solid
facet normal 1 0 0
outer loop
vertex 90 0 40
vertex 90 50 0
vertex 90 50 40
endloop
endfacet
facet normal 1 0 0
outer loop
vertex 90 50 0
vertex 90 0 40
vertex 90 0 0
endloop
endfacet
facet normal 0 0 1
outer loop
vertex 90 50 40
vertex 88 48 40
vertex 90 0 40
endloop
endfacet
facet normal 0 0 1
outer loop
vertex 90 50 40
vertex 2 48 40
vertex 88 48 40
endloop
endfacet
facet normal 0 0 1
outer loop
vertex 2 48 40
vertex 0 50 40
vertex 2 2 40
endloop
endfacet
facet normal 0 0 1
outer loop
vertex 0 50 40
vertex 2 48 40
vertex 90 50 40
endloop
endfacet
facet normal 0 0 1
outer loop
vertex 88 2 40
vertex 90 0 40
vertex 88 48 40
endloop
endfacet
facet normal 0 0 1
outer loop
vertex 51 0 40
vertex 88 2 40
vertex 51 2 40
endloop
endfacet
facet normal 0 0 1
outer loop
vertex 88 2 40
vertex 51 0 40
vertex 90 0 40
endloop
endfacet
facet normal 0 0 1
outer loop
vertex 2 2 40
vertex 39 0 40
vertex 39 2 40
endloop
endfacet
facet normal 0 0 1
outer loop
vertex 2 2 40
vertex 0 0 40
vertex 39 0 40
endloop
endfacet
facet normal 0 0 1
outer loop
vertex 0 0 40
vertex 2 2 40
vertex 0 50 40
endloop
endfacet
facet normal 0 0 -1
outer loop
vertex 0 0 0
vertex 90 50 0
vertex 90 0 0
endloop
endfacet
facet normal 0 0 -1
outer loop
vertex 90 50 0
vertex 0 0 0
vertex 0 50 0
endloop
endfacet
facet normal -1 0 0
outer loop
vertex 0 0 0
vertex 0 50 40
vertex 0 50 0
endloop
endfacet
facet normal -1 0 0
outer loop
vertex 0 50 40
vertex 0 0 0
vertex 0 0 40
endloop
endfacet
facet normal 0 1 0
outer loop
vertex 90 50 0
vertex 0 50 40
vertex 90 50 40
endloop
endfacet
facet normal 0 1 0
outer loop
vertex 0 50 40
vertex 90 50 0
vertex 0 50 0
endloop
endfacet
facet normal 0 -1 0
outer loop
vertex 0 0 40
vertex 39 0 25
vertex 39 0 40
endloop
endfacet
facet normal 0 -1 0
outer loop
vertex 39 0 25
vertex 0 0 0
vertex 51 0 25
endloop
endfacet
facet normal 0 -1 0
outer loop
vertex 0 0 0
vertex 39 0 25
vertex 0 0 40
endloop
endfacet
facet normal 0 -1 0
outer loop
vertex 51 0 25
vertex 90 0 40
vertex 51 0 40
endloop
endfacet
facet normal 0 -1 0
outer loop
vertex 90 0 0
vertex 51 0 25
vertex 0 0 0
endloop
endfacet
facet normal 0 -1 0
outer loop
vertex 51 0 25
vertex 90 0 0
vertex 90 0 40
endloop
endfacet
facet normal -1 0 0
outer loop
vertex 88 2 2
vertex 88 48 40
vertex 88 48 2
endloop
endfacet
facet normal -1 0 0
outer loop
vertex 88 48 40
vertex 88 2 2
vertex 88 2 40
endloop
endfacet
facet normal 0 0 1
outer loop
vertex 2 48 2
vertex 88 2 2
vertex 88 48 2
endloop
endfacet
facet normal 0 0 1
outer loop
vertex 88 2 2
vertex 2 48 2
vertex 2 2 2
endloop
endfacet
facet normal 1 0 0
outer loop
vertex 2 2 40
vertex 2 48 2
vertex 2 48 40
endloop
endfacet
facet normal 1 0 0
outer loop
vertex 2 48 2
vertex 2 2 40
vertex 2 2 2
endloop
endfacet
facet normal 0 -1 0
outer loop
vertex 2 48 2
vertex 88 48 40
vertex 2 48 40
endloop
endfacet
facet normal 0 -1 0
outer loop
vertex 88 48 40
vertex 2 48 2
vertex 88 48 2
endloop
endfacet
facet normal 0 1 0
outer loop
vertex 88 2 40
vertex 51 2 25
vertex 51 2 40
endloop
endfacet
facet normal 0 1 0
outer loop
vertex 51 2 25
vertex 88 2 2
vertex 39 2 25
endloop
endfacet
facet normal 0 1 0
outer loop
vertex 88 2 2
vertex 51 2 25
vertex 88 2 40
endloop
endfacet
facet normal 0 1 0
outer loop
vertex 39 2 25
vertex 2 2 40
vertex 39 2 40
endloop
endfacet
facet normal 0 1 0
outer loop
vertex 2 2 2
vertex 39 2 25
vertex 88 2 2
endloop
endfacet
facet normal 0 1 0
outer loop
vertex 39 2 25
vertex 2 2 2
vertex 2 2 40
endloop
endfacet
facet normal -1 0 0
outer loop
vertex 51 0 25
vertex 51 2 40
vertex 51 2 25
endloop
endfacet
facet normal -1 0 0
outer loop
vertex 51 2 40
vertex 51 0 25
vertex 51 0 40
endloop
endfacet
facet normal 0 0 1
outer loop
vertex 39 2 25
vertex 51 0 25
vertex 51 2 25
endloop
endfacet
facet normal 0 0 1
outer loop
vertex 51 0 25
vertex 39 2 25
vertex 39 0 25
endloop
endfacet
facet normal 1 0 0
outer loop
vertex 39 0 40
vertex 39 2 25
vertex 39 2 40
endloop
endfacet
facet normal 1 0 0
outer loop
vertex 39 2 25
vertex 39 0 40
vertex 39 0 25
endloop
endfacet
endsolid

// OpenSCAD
$fn = 32;

// ----------------------------------------------------------------------
// Enclosure box: notch enclosure
// ----------------------------------------------------------------------

// --- parameters (mm) ---
box_l = 90;               // outer length, X
box_w = 50;               // outer width, Y
box_h = 40;               // outer height
wall_t = 2;               // wall thickness
notch_w = 12;             // cable notch width
notch_h = 15;             // cable notch height

inner_h = box_h - wall_t;  // cavity depth
boss_h = inner_h - 2;  // corner boss height

difference() {
  cube([box_l, box_w, box_h]);
  translate([wall_t, wall_t, wall_t])
    cube([box_l - 2 * wall_t, box_w - 2 * wall_t, box_h]);
  translate([box_l / 2 - notch_w / 2, -1, box_h - notch_h])
    cube([notch_w, wall_t + 2, notch_h + 1]);
}
